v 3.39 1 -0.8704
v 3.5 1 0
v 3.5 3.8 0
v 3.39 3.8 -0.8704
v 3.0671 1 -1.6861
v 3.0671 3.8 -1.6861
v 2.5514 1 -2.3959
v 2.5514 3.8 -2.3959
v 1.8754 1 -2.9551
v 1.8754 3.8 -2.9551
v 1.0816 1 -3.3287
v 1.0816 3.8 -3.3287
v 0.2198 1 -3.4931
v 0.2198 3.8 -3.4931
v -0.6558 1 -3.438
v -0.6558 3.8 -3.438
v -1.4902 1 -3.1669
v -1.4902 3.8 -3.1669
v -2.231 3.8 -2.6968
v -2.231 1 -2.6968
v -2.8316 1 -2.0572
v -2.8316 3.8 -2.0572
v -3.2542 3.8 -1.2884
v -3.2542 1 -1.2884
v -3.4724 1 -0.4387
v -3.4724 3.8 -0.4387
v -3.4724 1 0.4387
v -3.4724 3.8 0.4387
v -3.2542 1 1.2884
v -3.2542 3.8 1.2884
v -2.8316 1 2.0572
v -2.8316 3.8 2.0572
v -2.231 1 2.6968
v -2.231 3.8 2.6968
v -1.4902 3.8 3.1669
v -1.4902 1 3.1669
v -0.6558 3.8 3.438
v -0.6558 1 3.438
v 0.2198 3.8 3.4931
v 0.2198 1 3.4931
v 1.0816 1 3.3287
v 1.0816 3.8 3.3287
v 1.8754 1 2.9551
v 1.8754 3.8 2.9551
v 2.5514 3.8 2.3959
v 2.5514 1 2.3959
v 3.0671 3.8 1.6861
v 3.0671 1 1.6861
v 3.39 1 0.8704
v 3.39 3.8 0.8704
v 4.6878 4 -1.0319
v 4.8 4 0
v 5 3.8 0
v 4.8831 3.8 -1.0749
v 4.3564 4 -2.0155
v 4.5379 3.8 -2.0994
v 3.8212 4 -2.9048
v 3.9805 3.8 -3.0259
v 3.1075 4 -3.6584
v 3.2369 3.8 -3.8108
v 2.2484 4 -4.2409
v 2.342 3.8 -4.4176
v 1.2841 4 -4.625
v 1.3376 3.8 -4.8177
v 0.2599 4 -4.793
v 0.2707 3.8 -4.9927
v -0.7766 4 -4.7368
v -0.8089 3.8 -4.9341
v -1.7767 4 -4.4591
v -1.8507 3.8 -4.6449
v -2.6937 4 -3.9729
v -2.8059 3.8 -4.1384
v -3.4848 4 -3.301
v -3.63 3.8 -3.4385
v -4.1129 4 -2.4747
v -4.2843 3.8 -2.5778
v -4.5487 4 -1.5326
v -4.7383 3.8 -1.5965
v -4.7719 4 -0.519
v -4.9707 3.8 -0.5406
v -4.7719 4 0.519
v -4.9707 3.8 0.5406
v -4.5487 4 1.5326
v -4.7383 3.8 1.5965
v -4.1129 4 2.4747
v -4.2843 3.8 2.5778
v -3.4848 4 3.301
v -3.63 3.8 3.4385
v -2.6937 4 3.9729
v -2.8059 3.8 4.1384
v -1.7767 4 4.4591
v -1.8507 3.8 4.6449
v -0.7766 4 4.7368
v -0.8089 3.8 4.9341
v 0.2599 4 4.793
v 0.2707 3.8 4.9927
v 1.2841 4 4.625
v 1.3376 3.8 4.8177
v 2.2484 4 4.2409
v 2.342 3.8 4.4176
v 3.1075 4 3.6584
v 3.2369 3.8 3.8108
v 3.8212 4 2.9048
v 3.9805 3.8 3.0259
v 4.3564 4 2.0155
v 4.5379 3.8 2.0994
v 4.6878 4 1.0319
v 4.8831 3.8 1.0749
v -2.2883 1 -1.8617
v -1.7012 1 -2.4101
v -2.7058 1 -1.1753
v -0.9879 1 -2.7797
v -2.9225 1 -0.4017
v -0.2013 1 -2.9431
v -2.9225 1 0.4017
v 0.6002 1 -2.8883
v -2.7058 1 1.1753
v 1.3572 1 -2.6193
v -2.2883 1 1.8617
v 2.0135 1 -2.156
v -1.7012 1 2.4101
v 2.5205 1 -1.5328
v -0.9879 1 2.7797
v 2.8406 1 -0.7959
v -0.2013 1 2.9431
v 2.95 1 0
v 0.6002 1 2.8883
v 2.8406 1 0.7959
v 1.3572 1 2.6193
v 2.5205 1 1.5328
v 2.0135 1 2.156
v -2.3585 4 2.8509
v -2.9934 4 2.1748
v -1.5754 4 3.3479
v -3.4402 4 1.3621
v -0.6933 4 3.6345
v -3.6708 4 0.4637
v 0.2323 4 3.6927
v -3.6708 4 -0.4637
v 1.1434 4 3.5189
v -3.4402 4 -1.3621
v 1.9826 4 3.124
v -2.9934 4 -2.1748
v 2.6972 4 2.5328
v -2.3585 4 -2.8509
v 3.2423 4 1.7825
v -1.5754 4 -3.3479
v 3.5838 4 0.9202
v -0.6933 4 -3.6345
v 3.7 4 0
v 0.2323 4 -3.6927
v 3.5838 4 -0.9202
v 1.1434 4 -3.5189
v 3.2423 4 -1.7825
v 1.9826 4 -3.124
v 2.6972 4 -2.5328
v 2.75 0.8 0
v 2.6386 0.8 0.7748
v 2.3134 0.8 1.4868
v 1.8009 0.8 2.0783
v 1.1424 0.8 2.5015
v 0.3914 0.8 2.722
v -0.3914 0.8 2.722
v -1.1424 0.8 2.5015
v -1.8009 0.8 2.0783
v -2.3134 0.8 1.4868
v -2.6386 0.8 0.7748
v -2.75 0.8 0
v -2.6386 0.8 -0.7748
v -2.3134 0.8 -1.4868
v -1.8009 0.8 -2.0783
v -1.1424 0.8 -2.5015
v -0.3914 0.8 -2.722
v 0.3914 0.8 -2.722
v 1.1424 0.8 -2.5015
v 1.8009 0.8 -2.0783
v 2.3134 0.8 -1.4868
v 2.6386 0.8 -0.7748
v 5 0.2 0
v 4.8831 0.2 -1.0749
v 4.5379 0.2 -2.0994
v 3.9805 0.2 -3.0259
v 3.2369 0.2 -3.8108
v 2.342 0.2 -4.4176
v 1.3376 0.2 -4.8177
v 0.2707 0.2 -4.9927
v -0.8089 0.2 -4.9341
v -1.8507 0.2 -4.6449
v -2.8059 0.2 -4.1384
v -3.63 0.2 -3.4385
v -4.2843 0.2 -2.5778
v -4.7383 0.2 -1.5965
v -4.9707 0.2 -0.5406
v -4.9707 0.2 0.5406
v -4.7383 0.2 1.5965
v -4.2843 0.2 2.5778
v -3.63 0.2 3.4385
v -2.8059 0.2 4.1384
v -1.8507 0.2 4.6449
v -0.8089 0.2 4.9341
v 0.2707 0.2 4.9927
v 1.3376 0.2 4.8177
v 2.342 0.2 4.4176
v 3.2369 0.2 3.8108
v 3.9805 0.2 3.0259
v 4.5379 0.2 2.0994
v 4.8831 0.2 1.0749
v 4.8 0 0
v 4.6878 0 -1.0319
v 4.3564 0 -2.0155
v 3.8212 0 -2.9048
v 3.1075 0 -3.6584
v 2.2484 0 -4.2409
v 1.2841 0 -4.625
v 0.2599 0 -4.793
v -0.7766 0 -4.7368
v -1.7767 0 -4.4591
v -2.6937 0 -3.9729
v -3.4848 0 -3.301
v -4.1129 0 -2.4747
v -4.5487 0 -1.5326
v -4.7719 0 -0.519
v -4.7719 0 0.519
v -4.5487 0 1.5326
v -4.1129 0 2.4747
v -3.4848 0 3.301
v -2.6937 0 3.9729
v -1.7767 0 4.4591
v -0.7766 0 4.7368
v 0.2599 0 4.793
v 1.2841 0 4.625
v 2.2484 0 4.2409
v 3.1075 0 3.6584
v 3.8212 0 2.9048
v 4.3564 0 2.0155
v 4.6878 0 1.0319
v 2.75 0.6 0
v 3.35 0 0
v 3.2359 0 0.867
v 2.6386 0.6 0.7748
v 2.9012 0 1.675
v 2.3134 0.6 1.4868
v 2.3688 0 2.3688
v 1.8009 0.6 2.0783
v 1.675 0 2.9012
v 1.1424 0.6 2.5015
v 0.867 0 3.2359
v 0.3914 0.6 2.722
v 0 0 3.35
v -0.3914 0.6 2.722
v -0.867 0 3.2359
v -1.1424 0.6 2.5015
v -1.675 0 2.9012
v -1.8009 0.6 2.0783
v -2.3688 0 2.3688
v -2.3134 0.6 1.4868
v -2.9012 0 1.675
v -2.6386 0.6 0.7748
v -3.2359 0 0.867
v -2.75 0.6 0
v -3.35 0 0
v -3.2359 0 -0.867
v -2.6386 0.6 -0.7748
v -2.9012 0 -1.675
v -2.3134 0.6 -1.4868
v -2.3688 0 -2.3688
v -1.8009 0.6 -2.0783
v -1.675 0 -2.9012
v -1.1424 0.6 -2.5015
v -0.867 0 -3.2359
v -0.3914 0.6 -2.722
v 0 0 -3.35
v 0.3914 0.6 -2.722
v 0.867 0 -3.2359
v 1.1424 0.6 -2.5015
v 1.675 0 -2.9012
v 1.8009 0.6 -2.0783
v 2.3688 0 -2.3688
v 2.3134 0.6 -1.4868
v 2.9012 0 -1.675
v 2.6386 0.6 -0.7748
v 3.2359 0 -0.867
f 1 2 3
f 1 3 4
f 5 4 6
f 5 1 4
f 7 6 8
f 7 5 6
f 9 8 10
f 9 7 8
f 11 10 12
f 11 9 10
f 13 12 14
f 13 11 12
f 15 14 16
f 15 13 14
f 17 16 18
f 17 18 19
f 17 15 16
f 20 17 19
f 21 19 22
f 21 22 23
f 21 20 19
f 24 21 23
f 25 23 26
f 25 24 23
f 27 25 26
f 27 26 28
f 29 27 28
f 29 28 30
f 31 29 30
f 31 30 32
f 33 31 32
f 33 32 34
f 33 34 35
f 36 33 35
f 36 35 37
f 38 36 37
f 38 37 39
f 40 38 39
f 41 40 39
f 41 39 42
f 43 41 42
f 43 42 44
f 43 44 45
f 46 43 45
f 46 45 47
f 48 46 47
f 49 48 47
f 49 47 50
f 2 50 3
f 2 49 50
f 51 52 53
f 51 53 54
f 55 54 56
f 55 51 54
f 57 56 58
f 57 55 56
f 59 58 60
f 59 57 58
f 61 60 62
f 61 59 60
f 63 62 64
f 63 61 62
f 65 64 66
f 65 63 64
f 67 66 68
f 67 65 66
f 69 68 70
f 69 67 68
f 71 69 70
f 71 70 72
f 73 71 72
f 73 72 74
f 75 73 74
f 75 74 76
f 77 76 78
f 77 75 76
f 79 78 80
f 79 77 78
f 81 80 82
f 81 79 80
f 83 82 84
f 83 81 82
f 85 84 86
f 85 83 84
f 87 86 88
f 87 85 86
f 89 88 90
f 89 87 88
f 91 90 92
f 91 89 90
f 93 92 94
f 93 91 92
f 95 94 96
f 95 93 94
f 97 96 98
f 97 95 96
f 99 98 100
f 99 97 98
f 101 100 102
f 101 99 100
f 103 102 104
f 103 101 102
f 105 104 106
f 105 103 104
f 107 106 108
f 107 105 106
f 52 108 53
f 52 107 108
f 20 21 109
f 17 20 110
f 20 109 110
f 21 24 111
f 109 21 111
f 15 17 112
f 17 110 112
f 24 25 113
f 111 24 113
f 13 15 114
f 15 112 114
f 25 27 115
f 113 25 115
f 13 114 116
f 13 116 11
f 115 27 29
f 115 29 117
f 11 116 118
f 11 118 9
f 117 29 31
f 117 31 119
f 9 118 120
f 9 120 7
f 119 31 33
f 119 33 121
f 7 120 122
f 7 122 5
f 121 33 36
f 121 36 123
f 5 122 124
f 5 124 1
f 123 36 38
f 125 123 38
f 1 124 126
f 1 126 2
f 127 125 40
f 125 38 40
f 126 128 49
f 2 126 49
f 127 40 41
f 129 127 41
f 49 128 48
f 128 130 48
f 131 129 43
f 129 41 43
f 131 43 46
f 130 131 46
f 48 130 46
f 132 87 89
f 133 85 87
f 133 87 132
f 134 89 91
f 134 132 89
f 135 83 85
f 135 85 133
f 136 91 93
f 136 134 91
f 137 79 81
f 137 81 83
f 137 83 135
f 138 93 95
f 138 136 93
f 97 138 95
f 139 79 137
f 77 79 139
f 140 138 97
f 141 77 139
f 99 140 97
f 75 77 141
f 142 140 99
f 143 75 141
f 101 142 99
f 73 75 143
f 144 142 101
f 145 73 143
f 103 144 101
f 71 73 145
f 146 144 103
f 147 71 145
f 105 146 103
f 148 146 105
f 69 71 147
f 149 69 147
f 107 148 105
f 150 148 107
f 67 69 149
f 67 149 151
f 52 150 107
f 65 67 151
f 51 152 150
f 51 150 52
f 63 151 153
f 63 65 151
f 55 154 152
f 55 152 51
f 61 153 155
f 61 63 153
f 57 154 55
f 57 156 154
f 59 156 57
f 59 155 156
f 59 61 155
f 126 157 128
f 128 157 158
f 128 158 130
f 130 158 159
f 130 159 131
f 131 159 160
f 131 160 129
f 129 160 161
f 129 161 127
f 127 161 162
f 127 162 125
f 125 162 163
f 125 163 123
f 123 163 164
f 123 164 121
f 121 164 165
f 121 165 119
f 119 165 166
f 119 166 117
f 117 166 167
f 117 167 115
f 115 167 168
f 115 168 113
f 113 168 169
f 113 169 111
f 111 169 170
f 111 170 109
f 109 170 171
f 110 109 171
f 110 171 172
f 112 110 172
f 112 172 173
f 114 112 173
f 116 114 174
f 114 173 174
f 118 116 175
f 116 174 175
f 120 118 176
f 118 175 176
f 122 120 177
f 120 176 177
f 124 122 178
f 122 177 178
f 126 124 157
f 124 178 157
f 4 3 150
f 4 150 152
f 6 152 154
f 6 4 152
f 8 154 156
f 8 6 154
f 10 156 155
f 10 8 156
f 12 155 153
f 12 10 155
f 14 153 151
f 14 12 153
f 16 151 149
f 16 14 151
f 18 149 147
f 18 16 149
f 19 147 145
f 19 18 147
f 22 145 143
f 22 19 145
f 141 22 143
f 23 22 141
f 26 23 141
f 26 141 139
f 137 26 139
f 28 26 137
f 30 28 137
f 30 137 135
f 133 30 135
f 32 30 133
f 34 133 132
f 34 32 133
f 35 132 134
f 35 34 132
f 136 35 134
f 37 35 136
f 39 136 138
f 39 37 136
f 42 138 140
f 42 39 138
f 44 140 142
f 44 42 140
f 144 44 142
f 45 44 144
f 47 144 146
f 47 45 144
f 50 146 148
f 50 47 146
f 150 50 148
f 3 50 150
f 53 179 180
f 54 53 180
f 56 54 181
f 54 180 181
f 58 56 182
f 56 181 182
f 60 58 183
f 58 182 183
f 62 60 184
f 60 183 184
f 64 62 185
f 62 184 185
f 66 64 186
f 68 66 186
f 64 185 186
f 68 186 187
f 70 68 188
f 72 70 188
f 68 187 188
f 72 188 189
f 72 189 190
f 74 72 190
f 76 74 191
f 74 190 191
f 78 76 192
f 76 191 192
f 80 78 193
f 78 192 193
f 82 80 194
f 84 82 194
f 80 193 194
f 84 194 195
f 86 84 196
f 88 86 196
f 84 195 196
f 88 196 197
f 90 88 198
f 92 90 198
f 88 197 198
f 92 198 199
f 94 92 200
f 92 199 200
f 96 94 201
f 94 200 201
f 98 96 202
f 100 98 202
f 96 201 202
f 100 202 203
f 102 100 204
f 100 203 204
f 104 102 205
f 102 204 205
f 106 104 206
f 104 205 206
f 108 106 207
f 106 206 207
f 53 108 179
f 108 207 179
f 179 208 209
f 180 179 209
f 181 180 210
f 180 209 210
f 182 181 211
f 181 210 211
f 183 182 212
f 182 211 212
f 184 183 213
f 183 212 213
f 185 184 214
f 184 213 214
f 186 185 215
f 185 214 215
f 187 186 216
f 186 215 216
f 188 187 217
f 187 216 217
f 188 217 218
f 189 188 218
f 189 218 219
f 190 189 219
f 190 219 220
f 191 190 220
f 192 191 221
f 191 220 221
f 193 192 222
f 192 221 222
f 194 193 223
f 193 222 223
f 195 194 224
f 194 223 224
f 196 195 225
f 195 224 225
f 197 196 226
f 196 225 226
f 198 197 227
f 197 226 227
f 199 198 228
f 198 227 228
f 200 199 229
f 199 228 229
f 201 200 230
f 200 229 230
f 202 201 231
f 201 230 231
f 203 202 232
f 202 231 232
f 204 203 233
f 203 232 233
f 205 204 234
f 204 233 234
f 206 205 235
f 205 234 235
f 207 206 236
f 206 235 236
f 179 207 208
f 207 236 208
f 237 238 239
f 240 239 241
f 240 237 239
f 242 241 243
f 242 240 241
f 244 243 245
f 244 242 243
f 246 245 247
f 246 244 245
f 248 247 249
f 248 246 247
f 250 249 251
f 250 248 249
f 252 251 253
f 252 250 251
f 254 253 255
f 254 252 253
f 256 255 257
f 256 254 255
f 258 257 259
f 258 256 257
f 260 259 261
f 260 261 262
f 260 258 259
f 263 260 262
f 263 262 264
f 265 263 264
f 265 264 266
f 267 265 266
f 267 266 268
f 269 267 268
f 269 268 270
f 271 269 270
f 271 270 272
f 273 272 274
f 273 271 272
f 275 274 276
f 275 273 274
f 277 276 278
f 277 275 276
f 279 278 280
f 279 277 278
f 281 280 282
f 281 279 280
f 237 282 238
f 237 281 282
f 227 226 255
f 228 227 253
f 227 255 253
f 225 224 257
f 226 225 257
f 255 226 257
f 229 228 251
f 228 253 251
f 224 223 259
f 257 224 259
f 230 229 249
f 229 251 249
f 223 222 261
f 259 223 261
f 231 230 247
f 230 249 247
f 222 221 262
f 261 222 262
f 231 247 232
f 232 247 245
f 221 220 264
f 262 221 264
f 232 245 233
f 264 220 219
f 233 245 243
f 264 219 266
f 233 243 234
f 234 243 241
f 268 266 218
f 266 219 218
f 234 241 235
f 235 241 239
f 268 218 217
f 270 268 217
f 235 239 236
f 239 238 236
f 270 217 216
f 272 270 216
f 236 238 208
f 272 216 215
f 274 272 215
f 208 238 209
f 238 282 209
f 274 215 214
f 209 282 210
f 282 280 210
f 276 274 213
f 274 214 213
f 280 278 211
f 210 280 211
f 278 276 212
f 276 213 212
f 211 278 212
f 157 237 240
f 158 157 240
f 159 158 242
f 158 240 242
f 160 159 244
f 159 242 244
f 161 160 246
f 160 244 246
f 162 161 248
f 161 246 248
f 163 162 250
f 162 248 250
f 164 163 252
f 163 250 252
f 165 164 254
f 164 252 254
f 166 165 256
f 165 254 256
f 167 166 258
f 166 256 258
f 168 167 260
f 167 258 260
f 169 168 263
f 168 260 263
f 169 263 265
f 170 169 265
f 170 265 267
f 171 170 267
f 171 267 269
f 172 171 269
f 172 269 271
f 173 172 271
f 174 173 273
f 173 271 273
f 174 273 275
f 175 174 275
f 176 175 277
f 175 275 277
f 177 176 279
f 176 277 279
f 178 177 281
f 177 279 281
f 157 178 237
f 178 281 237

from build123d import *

# Parameters (mm, degrees)
SKETCH1_R           = 5
SKETCH1_R_2         = 3.5
BOSS_EXTRUDE1_DEPTH = 4
SKETCH2_R           = 5
SKETCH2_R_2         = 2.75
BOSS_EXTRUDE2_DEPTH = 1
CHAMFER1_SIZE       = 0.2
CHAMFER2_SIZE       = 0.6


with BuildPart() as part:
    # Sketch1 → Boss-Extrude1 (new body)
    with BuildSketch(Plane(origin=(0, 0, 0), x_dir=(1, 0, 0), z_dir=(0, 1, 0))):
        Circle(SKETCH1_R)
        Circle(SKETCH1_R_2, mode=Mode.SUBTRACT)
    extrude(amount=BOSS_EXTRUDE1_DEPTH)

    # Sketch2 → Boss-Extrude2 (add)
    with BuildSketch(Plane.XZ):
        Circle(SKETCH2_R)
        Circle(SKETCH2_R_2, mode=Mode.SUBTRACT)
    extrude(amount=-BOSS_EXTRUDE2_DEPTH)

    # Chamfer1
    chamfer1_edges = [part.edges().sort_by_distance(p)[0] for p in [
        (-2.75, 1, 0),
        (-5, 0, 0),
        (-5, 4, 0),
        (-3.5, 4, 0),
    ]]
    chamfer(chamfer1_edges, length=CHAMFER1_SIZE)

    # Chamfer2
    chamfer2_edges = [part.edges().sort_by_distance(p)[0] for p in [
        (-2.75, 0, 0),
    ]]
    chamfer(chamfer2_edges, length=CHAMFER2_SIZE)


solid = part.part
